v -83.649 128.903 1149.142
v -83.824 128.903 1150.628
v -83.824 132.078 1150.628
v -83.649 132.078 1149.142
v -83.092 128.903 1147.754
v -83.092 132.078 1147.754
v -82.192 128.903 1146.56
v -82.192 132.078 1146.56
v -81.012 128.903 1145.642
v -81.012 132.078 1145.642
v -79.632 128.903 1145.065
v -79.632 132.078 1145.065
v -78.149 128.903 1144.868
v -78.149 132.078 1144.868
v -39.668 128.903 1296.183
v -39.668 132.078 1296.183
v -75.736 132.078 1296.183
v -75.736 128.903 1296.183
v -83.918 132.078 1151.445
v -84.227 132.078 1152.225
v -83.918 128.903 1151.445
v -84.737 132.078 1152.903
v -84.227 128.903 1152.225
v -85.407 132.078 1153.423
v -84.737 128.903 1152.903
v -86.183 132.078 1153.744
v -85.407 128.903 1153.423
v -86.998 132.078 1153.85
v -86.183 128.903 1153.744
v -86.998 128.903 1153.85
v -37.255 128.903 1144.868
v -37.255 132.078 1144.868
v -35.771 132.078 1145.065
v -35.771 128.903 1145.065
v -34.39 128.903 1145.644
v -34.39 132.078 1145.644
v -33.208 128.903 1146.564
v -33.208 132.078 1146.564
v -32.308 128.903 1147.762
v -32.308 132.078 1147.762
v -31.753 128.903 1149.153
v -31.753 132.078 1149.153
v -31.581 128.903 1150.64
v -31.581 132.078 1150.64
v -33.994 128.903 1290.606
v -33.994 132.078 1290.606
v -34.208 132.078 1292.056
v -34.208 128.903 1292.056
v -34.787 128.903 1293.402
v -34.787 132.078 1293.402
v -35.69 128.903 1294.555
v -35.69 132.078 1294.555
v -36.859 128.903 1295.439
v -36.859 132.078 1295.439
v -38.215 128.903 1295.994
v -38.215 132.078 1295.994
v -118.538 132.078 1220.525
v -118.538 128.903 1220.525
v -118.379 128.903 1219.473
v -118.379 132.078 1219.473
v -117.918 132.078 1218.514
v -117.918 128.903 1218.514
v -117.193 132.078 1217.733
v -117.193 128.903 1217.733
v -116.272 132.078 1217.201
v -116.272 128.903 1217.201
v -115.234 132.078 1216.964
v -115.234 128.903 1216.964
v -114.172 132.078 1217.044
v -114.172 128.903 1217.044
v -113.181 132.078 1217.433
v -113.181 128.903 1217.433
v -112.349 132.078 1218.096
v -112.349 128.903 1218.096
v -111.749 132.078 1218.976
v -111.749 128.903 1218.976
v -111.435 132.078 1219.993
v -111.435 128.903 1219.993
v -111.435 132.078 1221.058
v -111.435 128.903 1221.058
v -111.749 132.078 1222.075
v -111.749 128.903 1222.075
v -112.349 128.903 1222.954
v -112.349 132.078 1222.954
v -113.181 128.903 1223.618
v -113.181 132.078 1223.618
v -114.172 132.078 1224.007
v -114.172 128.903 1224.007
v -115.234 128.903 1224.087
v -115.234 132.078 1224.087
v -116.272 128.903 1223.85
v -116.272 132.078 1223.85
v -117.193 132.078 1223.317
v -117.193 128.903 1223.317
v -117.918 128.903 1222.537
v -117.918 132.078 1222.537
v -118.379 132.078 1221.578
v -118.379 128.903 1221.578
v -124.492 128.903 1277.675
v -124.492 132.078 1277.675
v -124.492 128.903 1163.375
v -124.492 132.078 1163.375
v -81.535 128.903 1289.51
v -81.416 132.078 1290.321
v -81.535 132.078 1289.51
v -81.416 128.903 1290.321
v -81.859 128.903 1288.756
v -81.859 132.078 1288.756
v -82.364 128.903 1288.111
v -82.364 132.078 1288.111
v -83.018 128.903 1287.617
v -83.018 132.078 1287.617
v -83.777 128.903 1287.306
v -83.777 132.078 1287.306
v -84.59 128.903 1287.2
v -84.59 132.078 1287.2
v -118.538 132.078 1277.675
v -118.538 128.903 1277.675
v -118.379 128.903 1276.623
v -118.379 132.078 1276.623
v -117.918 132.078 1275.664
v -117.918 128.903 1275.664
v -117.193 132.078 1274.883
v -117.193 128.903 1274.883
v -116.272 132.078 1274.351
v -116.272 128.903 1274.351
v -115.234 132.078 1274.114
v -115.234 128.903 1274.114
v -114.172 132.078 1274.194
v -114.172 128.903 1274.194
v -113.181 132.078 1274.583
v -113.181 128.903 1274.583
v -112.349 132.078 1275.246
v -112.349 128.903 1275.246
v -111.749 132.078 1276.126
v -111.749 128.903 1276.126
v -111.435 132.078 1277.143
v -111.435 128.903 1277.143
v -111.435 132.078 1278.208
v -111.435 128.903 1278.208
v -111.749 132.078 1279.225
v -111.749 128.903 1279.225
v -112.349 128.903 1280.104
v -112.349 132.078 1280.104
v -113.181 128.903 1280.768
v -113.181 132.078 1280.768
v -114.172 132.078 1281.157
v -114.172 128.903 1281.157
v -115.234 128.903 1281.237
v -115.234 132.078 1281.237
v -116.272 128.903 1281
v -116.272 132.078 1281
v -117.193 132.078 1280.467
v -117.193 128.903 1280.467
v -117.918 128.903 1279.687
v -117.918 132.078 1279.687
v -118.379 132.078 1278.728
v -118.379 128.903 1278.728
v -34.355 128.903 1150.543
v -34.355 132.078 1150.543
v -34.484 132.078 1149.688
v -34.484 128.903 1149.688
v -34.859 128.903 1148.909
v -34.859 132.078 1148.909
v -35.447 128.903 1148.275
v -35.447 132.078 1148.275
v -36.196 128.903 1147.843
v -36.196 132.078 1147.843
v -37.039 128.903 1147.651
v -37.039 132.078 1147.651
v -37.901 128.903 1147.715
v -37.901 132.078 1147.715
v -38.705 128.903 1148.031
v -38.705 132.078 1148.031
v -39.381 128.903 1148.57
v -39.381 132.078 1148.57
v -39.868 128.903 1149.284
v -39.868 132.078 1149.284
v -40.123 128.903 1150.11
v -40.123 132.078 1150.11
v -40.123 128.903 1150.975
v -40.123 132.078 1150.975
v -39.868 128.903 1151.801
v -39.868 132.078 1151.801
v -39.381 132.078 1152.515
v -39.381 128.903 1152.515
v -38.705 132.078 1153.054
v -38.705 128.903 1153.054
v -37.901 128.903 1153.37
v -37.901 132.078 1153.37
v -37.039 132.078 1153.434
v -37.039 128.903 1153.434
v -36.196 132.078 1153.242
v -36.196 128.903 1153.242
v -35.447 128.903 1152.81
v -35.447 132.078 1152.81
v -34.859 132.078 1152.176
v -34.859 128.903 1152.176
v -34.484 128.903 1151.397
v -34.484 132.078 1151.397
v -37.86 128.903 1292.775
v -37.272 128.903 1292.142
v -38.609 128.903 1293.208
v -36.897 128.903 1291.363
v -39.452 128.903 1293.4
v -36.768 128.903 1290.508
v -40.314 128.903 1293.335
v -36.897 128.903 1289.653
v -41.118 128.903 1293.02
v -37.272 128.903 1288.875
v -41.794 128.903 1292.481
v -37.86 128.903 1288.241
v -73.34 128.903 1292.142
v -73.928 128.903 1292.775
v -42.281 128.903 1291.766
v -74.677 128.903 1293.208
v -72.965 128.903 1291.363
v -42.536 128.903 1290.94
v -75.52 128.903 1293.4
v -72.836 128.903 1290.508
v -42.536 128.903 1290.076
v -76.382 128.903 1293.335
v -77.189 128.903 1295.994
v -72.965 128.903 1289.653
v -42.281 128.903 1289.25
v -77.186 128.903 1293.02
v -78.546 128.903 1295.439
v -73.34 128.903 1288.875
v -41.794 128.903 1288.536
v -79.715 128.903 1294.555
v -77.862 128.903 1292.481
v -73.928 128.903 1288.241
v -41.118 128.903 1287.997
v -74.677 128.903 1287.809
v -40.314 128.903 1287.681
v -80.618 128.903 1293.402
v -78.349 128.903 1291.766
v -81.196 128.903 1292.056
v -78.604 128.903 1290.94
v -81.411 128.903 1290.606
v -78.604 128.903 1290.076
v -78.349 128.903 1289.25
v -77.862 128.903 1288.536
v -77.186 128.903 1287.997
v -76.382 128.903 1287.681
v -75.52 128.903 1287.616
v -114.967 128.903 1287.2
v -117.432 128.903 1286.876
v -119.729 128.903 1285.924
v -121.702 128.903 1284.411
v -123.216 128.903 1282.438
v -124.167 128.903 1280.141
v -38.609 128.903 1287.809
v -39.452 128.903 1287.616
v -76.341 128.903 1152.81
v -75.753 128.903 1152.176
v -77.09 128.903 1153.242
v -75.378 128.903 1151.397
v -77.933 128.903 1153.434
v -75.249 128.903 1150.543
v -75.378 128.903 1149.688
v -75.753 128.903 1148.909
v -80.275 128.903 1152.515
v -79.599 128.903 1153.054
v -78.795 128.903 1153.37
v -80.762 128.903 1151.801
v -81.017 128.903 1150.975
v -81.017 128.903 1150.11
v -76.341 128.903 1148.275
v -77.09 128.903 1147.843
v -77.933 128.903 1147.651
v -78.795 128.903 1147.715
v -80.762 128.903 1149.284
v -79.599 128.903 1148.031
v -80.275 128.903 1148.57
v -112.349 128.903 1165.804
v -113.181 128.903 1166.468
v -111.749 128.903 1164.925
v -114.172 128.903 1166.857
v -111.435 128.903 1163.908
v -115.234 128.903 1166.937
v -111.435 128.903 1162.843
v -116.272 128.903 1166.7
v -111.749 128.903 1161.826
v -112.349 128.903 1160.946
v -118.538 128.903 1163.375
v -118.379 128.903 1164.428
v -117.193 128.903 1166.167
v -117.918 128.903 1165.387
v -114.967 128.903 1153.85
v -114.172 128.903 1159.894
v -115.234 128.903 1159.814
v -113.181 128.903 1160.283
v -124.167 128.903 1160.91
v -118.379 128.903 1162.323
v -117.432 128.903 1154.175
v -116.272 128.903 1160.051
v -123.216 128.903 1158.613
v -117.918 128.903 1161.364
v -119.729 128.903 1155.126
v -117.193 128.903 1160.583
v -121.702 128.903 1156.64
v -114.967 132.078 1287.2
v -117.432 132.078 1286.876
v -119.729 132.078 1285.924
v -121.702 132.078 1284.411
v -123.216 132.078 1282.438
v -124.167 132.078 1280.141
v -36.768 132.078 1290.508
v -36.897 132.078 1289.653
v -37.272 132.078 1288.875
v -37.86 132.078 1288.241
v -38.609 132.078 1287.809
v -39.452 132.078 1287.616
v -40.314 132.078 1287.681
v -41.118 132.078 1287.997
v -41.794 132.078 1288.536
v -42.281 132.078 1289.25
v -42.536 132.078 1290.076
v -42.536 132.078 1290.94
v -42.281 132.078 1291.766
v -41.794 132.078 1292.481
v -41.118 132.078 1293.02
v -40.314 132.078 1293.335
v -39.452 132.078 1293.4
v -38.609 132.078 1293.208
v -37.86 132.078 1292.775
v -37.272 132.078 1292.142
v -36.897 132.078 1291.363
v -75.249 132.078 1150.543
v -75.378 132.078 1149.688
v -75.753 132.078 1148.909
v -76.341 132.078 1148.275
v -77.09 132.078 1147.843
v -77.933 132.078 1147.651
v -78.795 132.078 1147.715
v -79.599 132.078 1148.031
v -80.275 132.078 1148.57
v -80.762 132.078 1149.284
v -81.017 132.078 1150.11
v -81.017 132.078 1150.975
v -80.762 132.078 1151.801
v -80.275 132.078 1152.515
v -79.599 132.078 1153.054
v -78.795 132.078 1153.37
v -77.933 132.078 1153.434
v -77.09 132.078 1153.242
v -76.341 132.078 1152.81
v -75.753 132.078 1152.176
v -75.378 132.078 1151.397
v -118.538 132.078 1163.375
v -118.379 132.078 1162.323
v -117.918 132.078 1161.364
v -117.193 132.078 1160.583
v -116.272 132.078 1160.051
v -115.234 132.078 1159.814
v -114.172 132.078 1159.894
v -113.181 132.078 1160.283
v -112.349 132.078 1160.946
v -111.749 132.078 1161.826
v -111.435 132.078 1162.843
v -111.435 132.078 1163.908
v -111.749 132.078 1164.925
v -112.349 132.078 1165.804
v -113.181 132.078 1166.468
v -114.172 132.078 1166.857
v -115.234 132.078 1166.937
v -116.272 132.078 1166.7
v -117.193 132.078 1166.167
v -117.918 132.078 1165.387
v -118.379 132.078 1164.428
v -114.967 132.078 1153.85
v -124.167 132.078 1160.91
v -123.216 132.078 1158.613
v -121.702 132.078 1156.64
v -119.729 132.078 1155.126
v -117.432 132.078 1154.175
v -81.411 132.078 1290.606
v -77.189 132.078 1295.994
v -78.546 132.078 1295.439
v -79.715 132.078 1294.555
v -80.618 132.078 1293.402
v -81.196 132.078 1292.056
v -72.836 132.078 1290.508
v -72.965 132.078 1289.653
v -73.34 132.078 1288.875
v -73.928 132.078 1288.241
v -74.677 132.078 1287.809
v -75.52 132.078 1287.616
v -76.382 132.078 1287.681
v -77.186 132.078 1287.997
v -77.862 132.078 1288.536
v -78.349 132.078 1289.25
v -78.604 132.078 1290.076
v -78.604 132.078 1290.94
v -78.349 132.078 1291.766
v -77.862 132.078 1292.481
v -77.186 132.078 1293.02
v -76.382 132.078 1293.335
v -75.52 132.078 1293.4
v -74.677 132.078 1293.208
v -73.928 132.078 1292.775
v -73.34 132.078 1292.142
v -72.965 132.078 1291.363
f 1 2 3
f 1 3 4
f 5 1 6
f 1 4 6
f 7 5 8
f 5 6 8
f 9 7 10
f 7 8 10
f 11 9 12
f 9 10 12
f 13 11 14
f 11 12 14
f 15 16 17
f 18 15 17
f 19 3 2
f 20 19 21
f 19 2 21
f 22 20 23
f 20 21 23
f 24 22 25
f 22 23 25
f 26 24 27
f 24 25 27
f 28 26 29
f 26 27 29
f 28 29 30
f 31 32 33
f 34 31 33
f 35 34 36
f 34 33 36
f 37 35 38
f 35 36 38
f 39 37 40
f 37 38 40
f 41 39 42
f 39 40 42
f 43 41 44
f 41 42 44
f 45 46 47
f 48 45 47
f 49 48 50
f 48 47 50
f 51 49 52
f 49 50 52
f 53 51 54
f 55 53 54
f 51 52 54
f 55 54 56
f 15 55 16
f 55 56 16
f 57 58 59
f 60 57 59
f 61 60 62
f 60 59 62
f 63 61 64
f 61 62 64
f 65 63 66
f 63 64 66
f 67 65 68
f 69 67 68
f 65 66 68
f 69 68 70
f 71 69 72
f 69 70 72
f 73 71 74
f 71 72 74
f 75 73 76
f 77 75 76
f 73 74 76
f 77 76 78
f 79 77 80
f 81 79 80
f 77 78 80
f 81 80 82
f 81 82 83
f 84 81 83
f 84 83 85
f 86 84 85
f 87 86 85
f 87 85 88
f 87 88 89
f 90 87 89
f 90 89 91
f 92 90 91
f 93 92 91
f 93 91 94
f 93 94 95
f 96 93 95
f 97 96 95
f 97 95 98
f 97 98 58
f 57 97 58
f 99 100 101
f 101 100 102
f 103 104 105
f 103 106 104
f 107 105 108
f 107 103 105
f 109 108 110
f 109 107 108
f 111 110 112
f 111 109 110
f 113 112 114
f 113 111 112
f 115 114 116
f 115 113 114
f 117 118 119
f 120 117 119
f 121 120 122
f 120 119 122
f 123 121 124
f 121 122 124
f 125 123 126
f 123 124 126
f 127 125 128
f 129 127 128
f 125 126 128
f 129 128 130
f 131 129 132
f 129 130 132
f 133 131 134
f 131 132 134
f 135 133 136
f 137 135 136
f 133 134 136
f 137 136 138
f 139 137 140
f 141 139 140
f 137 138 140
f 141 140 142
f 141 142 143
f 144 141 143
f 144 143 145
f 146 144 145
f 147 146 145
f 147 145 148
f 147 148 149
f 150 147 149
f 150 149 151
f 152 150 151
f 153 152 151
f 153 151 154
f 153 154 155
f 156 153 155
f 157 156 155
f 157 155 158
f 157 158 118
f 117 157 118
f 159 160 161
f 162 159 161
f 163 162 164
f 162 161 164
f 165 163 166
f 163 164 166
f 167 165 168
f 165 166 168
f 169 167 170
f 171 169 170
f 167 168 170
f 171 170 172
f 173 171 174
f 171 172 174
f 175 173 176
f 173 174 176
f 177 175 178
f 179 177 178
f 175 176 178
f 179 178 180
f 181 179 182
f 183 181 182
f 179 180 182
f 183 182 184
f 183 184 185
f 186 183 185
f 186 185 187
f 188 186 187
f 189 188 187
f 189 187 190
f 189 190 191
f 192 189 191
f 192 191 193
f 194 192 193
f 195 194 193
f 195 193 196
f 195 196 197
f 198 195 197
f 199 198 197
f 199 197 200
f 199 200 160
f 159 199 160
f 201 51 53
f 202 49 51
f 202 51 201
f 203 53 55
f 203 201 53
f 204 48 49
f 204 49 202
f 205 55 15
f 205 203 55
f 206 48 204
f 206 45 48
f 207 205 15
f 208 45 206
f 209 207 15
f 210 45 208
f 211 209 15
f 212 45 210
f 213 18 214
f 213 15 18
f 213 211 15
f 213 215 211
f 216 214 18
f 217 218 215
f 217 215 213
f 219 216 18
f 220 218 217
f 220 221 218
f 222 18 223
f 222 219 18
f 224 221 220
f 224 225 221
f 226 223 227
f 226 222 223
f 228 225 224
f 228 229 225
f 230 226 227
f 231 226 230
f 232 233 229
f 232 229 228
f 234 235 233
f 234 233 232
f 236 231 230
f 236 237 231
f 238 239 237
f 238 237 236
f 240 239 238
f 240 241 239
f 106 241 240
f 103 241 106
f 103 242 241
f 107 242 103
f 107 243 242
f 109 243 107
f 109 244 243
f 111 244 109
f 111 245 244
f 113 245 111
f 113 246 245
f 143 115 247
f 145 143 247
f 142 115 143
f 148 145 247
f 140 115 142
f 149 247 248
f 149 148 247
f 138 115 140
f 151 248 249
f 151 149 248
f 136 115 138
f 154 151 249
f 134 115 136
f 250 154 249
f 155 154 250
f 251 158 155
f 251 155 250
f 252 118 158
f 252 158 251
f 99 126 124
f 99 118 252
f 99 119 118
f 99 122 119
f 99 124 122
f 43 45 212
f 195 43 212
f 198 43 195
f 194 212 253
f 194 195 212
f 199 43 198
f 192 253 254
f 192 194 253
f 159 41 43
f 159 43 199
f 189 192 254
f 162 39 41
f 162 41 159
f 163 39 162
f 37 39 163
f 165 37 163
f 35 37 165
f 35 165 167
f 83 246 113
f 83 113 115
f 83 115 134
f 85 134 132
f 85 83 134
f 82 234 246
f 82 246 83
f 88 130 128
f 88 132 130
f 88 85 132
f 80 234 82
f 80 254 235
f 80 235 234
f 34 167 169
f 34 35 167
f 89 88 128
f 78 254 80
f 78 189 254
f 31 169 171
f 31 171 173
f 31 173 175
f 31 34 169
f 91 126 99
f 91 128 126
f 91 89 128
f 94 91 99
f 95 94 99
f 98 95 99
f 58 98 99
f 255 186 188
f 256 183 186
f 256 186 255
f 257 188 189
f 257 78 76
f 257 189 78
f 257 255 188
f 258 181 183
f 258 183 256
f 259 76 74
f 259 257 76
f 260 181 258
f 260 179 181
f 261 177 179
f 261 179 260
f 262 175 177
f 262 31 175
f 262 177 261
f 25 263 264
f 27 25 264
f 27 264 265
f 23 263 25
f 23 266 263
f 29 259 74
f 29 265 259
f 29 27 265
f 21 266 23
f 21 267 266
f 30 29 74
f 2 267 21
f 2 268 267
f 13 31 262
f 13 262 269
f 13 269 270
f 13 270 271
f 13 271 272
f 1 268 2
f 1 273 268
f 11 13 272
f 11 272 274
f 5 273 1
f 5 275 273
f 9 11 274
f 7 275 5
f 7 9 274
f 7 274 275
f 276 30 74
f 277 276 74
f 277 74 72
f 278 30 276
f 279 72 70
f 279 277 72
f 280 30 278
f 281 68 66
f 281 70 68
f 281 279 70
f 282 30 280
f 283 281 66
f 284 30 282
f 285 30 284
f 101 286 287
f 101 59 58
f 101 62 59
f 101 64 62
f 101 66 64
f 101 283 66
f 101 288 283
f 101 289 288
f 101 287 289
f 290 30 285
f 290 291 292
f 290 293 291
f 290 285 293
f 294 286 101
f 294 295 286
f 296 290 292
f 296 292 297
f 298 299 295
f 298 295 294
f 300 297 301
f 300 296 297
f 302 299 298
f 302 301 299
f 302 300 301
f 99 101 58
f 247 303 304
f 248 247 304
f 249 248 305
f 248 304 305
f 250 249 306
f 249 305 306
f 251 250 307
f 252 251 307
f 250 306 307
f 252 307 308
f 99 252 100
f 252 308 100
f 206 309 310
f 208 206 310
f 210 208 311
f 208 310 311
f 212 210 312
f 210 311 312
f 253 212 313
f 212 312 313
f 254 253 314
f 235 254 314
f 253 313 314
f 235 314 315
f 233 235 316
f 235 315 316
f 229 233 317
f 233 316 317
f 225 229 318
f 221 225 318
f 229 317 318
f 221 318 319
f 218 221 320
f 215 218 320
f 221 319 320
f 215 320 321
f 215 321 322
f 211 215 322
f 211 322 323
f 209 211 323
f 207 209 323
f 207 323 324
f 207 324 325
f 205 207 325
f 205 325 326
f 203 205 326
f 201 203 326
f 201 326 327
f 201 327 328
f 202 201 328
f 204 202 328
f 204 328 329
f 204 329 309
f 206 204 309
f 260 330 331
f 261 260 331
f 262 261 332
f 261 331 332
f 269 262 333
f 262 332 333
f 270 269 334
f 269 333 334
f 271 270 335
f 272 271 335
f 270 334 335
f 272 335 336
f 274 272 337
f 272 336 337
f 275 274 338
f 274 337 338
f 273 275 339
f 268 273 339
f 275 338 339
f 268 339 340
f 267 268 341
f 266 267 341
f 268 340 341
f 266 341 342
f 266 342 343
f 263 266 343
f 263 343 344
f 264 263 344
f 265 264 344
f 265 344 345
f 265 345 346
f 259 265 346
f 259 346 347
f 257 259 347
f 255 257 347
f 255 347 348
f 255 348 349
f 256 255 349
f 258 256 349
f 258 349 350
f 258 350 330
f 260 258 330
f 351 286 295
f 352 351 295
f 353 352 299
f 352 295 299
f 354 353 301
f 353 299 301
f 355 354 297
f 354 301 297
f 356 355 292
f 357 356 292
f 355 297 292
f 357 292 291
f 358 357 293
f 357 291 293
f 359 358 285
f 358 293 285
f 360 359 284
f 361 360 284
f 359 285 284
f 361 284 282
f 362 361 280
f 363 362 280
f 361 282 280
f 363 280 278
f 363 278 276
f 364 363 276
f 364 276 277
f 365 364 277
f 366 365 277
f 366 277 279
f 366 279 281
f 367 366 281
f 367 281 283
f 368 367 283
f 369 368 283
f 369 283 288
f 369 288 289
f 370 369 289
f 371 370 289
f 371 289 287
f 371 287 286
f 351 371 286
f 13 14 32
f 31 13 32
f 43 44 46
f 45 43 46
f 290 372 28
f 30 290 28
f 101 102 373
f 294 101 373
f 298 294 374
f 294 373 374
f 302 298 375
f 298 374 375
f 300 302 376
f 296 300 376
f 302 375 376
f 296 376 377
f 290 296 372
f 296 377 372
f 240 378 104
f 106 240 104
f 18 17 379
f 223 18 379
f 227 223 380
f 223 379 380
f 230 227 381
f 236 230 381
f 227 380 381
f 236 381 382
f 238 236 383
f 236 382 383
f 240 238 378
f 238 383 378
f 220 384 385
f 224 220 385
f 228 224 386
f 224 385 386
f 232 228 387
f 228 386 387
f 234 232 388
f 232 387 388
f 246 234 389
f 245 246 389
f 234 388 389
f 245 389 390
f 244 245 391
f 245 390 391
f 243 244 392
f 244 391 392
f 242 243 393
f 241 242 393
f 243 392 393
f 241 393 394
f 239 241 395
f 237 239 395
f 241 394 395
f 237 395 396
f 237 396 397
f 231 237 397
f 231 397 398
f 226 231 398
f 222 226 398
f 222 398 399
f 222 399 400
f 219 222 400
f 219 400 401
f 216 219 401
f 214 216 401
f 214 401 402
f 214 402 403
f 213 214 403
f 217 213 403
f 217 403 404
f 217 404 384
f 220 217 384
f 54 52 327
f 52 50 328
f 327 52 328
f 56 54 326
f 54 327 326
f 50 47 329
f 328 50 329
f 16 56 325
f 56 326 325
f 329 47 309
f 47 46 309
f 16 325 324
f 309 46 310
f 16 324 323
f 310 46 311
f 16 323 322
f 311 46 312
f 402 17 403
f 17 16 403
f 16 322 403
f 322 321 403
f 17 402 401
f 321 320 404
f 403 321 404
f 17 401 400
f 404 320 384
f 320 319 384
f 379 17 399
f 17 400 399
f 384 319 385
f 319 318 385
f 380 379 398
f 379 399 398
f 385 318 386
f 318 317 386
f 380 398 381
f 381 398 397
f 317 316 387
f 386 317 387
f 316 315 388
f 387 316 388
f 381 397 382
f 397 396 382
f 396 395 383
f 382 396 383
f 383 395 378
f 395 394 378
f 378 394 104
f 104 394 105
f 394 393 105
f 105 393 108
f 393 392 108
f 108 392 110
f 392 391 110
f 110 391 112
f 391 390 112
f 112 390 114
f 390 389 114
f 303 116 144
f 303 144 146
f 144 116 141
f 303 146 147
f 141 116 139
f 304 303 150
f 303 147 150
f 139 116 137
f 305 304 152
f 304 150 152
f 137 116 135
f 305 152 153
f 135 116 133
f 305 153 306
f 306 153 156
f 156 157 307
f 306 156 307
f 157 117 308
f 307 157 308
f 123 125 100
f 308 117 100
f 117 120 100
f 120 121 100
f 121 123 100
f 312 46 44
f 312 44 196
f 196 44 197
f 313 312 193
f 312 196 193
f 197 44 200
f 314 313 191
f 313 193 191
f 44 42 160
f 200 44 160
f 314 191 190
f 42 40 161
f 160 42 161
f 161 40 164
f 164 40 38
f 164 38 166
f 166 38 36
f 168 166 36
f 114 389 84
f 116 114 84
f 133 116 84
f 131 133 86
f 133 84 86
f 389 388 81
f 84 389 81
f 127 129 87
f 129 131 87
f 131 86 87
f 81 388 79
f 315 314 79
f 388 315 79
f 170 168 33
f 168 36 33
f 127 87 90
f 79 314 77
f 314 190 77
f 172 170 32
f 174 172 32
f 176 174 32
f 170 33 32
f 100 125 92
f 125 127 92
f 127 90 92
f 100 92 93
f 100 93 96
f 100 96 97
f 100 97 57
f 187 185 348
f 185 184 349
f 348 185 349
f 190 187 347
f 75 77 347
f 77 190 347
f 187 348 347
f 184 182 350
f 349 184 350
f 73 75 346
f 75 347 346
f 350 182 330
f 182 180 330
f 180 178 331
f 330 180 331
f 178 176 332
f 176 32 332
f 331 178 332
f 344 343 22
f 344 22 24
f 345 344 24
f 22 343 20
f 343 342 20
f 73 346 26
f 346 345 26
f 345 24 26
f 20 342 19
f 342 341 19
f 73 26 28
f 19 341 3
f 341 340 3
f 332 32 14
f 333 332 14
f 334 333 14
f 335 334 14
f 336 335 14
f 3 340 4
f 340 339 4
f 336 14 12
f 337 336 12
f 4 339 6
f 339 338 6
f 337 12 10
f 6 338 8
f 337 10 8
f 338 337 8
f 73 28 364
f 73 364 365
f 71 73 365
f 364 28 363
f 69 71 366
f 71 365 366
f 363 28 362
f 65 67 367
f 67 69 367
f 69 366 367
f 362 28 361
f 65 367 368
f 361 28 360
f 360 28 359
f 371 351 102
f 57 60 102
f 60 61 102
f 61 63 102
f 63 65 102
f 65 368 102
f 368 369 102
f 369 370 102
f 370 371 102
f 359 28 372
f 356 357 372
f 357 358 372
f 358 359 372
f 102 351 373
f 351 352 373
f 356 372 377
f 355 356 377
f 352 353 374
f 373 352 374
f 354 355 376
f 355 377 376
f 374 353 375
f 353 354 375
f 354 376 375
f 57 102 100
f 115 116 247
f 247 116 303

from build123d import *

# Parameters (mm, degrees)
BOSS_EXTRUDE1_START     = -12.827
BOSS_EXTRUDE1_DEPTH     = 3.175
M5_CLEARANCE_HOLE1_D    = 5.8
F_1_4_CLEARANCE_HOLE1_D = 7.14248
FILLET1_R               = 3.175


with BuildPart() as part:
    # Sketch1 → Boss-Extrude1 (new body)
    with BuildSketch(Plane(origin=(0, 144.904574554, 0), x_dir=(1, 0, 0), z_dir=(0, 1, 0)).offset(BOSS_EXTRUDE1_START)):
        with BuildLine():
            Line((-78.14945, -1144.867512521), (-37.25545, -1144.867512521))
            ThreePointArc((-37.25545, -1144.867512521), (-33.208181466, -1146.564417216), (-31.581293209, -1150.640334625))
            Line((-31.581293209, -1150.640334625), (-33.994293209, -1290.605977985))
            ThreePointArc((-33.994293209, -1290.605977985), (-35.690354742, -1294.555424368), (-39.66845, -1296.183155787))
            Line((-39.66845, -1296.183155787), (-75.73645, -1296.183155787))
            ThreePointArc((-75.73645, -1296.183155787), (-79.714545258, -1294.555424368), (-81.410606791, -1290.605977985))
            Line((-81.410606791, -1290.605977985), (-81.469319904, -1287.200334154))
            Line((-81.469319904, -1287.200334154), (-114.966812484, -1287.200334154))
            ThreePointArc((-114.966812484, -1287.200334154), (-121.702004575, -1284.410526245), (-124.491812484, -1277.675334154))
            Line((-124.491812484, -1277.675334154), (-124.491812484, -1220.525334154))
            Line((-124.491812484, -1220.525334154), (-124.491812484, -1163.375334154))
            ThreePointArc((-124.491812484, -1163.375334154), (-121.702004575, -1156.640142063), (-114.966812484, -1153.850334154))
            Line((-114.966812484, -1153.850334154), (-83.768266576, -1153.850334154))
            Line((-83.768266576, -1153.850334154), (-83.823606791, -1150.640334625))
            ThreePointArc((-83.823606791, -1150.640334625), (-82.196718534, -1146.564417216), (-78.14945, -1144.867512521))
        make_face()
    extrude(amount=-BOSS_EXTRUDE1_DEPTH)

    # M5 Clearance Hole1 (through all)
    with Locations(Plane(origin=(0, 128.902574554, 0), x_dir=(-1, 0, 0), z_dir=(0, -1, 0))):
        with Locations((39.66845, -1290.508155834), (75.73645, -1290.508155834), (37.25545, -1150.542512474), (78.14945, -1150.542512474)):
            Hole(M5_CLEARANCE_HOLE1_D / 2)

    # 1/4 Clearance Hole1 (through all)
    with Locations(Plane(origin=(0, 132.077574554, 0), x_dir=(1, 0, 0), z_dir=(0, 1, 0))):
        with Locations((-0.438087516, -1163.375334154), (-0.438087516, -1220.525334154), (-0.438087516, -1277.675334154), (-114.966812484, -1163.375334154), (-114.966812484, -1220.525334154), (-114.966812484, -1277.675334154)):
            Hole(F_1_4_CLEARANCE_HOLE1_D / 2)

    # Fillet1
    fillet1_edges = [part.edges().sort_by_distance(p)[0] for p in [
        (-81.469319904, 130.490074554, 1287.200334154),
        (-83.768266576, 130.490074554, 1153.850334154),
    ]]
    fillet(fillet1_edges, radius=FILLET1_R)


solid = part.part
